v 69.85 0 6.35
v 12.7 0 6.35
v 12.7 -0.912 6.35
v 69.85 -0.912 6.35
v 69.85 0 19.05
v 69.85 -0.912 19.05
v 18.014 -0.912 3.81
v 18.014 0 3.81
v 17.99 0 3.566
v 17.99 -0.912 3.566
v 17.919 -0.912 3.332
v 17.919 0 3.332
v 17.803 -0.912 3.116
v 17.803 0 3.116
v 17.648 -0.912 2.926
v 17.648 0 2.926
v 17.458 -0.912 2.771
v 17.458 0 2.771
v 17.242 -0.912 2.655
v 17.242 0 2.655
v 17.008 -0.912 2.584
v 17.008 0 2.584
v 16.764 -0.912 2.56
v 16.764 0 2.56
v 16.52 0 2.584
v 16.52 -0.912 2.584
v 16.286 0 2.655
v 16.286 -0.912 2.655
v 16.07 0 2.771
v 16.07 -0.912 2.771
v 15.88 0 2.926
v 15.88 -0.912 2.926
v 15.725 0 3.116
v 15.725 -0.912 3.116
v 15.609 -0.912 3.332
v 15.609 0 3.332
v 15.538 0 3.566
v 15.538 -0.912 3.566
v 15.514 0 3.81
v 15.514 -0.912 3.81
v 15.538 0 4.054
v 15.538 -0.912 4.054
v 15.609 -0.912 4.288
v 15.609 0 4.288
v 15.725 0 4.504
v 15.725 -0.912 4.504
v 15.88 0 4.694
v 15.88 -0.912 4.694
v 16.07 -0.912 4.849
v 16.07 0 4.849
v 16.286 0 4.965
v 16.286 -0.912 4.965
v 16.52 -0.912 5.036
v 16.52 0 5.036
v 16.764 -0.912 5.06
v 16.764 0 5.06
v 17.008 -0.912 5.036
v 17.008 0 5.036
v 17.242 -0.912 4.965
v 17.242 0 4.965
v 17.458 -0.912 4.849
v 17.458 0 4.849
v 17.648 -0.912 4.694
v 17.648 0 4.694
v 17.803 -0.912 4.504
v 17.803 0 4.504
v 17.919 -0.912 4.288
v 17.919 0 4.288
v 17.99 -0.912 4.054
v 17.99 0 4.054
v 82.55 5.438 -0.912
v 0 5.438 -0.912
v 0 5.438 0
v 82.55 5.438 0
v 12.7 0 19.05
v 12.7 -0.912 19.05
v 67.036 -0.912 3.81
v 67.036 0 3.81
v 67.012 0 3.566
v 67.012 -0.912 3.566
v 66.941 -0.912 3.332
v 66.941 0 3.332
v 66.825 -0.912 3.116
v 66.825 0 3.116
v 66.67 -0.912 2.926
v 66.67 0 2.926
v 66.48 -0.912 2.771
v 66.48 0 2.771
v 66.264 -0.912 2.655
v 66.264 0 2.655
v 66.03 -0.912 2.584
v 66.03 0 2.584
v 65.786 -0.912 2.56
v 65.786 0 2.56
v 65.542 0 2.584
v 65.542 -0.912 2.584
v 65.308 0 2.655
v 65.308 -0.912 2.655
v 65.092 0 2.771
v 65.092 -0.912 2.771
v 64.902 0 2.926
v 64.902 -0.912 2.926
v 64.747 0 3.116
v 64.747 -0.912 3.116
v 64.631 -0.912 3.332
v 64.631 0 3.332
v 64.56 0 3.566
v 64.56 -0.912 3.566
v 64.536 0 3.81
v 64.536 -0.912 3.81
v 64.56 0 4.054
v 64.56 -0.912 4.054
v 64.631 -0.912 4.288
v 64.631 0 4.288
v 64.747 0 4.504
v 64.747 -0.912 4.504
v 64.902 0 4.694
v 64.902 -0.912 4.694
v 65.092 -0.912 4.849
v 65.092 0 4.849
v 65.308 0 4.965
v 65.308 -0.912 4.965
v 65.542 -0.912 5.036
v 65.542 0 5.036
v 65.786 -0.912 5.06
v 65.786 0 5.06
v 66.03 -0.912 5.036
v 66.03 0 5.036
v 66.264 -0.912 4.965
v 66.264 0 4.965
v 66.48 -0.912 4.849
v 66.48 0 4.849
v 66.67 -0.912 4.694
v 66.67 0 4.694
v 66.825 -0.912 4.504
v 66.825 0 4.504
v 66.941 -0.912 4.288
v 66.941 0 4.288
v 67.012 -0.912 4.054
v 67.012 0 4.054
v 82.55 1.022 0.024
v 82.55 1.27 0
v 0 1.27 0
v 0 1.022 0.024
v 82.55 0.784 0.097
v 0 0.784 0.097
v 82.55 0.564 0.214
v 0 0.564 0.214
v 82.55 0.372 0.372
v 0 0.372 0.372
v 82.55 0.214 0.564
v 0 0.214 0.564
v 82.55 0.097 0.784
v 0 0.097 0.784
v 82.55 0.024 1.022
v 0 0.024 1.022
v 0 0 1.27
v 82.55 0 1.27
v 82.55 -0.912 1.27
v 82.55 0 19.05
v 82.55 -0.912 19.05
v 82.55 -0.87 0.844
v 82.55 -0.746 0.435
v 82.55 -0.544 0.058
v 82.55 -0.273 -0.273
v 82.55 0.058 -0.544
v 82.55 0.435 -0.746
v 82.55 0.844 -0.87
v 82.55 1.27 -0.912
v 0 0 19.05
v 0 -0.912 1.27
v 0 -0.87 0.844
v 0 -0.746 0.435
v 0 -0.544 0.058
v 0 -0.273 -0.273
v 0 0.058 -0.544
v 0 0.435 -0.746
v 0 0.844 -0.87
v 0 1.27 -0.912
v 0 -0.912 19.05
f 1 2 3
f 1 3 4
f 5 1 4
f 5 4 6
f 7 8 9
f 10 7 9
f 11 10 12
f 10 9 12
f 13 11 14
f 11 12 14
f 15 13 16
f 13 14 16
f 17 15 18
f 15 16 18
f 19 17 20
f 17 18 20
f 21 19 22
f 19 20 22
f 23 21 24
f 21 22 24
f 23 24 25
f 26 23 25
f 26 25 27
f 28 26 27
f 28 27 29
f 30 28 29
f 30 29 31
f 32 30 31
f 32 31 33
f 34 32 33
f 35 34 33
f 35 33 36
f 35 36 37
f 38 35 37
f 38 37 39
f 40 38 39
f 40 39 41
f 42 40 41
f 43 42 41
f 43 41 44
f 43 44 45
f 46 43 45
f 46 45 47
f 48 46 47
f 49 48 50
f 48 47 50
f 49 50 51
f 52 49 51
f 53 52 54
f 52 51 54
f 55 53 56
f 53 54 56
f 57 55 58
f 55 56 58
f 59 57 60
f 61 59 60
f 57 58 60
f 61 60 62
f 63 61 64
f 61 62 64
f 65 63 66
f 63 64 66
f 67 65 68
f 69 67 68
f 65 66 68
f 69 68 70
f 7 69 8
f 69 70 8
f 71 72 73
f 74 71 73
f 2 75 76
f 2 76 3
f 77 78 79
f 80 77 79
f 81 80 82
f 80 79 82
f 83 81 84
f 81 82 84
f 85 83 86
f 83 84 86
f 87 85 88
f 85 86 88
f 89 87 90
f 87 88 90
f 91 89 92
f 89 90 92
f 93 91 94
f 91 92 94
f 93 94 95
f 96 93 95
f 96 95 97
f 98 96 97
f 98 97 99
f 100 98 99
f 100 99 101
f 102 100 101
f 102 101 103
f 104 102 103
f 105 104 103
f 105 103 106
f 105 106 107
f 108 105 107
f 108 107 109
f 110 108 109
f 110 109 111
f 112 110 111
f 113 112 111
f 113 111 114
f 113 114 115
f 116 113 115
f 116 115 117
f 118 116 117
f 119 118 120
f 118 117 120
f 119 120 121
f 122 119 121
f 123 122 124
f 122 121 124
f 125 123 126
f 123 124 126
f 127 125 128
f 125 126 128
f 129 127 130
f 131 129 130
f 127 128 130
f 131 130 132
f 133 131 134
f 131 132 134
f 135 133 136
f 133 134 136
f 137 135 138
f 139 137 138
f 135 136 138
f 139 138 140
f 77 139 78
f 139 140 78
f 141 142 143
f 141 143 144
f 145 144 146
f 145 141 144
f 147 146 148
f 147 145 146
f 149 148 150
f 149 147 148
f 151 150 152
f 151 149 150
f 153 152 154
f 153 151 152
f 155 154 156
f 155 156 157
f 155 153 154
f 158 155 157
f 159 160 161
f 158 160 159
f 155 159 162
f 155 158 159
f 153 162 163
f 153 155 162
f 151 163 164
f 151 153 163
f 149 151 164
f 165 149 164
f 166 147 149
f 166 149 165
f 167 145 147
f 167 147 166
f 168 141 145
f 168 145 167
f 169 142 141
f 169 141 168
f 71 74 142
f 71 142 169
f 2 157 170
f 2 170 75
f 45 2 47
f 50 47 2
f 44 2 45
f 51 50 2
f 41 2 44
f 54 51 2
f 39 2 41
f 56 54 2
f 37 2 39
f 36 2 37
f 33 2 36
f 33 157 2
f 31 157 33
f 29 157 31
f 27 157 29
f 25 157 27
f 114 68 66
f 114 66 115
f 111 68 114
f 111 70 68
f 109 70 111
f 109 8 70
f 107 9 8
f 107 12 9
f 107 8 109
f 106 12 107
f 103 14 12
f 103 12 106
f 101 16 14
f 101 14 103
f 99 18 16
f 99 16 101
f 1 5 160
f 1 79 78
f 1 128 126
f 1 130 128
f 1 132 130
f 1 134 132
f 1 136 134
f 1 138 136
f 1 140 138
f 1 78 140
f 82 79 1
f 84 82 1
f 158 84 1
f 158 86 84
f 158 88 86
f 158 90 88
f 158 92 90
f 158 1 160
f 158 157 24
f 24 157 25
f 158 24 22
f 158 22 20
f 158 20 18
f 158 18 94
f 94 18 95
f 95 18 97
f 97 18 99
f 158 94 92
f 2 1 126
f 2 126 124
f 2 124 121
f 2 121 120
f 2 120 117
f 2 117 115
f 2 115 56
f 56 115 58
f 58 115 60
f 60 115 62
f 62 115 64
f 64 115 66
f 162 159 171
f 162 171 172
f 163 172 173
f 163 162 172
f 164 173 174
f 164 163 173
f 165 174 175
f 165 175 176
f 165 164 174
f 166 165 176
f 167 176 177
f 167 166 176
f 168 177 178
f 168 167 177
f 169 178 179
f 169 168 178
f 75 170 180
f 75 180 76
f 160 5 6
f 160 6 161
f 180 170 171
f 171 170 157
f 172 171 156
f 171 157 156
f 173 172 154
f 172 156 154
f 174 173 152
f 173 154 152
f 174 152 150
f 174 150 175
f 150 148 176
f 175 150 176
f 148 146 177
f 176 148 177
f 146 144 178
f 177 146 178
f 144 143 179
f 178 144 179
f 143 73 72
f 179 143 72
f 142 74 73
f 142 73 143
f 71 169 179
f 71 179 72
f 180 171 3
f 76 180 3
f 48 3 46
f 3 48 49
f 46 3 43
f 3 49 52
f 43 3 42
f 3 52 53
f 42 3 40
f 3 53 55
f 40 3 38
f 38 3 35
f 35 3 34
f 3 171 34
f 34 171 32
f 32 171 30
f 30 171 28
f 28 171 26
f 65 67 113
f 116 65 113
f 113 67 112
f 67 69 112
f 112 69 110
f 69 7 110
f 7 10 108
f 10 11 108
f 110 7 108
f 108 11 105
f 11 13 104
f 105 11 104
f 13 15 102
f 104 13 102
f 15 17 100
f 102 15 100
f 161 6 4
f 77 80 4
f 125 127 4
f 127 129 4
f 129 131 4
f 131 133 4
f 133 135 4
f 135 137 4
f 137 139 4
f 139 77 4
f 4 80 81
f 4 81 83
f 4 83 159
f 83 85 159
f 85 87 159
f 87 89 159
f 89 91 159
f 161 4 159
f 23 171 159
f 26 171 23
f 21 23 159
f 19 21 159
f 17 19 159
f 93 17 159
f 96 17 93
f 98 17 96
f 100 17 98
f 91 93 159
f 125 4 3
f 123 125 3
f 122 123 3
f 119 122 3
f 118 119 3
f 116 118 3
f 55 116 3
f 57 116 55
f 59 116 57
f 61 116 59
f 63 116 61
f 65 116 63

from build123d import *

# Parameters (mm, degrees)
BASE_FLANGE1_DEPTH           = 0.91186
F_2_5MM_DOWEL_HOLE1_D        = 2.5
EDGE_FLANGE1_STRIP_W         = 6.18744
EDGE_FLANGE1_STRIP_H         = 0.91186
EDGE_FLANGE1_STRIP_CUT_DEPTH = 82.55
EDGE_FLANGE1_DEPTH           = 82.55


# Sheet-metal steps are written as plain solids
with BuildPart() as part:
    # Sketch1 → Base-Flange1 (new body)
    with BuildSketch(Plane(origin=(0, 0, 0), x_dir=(1, 0, 0), z_dir=(0, 1, 0))):
        Polygon((0, 0), (0, -19.05), (12.7, -19.05), (12.7, -6.35), (69.85, -6.35), (69.85, -19.05), (82.55, -19.05), (82.55, 0), align=None)
    extrude(amount=-BASE_FLANGE1_DEPTH)

    # Ø2.5mm Dowel Hole1 (through all)
    with Locations(Plane(origin=(0, -0.91186, 0), x_dir=(-1, 0, 0), z_dir=(0, -1, 0))):
        with Locations((-65.786, -3.81), (-16.764, -3.81)):
            Hole(F_2_5MM_DOWEL_HOLE1_D / 2)

    # Edge-Flange1 strip (across the edge) → Edge-Flange1 strip cut (cut)
    with BuildSketch(Plane.ZY.offset(-82.55)):
        with Locations((-1.82372, -0.45593)):
            Rectangle(EDGE_FLANGE1_STRIP_W, EDGE_FLANGE1_STRIP_H)
    extrude(amount=EDGE_FLANGE1_STRIP_CUT_DEPTH, mode=Mode.SUBTRACT)

    # Edge-Flange1 section (across the edge) → Edge-Flange1 (add)
    with BuildSketch(Plane.ZY.offset(-82.55)):
        with BuildLine():
            Line((-0.91186, 1.27), (-0.91186, 5.43814))
            Line((-0.91186, 5.43814), (0, 5.43814))
            Line((0, 5.43814), (0, 1.27))
            ThreePointArc((0, 1.27), (0.371974388, 0.371974388), (1.27, 0))
            Line((1.27, 0), (1.27, -0.91186))
            ThreePointArc((1.27, -0.91186), (-0.272808002, -0.272808002), (-0.91186, 1.27))
        make_face()
    extrude(amount=EDGE_FLANGE1_DEPTH)


solid = part.part
